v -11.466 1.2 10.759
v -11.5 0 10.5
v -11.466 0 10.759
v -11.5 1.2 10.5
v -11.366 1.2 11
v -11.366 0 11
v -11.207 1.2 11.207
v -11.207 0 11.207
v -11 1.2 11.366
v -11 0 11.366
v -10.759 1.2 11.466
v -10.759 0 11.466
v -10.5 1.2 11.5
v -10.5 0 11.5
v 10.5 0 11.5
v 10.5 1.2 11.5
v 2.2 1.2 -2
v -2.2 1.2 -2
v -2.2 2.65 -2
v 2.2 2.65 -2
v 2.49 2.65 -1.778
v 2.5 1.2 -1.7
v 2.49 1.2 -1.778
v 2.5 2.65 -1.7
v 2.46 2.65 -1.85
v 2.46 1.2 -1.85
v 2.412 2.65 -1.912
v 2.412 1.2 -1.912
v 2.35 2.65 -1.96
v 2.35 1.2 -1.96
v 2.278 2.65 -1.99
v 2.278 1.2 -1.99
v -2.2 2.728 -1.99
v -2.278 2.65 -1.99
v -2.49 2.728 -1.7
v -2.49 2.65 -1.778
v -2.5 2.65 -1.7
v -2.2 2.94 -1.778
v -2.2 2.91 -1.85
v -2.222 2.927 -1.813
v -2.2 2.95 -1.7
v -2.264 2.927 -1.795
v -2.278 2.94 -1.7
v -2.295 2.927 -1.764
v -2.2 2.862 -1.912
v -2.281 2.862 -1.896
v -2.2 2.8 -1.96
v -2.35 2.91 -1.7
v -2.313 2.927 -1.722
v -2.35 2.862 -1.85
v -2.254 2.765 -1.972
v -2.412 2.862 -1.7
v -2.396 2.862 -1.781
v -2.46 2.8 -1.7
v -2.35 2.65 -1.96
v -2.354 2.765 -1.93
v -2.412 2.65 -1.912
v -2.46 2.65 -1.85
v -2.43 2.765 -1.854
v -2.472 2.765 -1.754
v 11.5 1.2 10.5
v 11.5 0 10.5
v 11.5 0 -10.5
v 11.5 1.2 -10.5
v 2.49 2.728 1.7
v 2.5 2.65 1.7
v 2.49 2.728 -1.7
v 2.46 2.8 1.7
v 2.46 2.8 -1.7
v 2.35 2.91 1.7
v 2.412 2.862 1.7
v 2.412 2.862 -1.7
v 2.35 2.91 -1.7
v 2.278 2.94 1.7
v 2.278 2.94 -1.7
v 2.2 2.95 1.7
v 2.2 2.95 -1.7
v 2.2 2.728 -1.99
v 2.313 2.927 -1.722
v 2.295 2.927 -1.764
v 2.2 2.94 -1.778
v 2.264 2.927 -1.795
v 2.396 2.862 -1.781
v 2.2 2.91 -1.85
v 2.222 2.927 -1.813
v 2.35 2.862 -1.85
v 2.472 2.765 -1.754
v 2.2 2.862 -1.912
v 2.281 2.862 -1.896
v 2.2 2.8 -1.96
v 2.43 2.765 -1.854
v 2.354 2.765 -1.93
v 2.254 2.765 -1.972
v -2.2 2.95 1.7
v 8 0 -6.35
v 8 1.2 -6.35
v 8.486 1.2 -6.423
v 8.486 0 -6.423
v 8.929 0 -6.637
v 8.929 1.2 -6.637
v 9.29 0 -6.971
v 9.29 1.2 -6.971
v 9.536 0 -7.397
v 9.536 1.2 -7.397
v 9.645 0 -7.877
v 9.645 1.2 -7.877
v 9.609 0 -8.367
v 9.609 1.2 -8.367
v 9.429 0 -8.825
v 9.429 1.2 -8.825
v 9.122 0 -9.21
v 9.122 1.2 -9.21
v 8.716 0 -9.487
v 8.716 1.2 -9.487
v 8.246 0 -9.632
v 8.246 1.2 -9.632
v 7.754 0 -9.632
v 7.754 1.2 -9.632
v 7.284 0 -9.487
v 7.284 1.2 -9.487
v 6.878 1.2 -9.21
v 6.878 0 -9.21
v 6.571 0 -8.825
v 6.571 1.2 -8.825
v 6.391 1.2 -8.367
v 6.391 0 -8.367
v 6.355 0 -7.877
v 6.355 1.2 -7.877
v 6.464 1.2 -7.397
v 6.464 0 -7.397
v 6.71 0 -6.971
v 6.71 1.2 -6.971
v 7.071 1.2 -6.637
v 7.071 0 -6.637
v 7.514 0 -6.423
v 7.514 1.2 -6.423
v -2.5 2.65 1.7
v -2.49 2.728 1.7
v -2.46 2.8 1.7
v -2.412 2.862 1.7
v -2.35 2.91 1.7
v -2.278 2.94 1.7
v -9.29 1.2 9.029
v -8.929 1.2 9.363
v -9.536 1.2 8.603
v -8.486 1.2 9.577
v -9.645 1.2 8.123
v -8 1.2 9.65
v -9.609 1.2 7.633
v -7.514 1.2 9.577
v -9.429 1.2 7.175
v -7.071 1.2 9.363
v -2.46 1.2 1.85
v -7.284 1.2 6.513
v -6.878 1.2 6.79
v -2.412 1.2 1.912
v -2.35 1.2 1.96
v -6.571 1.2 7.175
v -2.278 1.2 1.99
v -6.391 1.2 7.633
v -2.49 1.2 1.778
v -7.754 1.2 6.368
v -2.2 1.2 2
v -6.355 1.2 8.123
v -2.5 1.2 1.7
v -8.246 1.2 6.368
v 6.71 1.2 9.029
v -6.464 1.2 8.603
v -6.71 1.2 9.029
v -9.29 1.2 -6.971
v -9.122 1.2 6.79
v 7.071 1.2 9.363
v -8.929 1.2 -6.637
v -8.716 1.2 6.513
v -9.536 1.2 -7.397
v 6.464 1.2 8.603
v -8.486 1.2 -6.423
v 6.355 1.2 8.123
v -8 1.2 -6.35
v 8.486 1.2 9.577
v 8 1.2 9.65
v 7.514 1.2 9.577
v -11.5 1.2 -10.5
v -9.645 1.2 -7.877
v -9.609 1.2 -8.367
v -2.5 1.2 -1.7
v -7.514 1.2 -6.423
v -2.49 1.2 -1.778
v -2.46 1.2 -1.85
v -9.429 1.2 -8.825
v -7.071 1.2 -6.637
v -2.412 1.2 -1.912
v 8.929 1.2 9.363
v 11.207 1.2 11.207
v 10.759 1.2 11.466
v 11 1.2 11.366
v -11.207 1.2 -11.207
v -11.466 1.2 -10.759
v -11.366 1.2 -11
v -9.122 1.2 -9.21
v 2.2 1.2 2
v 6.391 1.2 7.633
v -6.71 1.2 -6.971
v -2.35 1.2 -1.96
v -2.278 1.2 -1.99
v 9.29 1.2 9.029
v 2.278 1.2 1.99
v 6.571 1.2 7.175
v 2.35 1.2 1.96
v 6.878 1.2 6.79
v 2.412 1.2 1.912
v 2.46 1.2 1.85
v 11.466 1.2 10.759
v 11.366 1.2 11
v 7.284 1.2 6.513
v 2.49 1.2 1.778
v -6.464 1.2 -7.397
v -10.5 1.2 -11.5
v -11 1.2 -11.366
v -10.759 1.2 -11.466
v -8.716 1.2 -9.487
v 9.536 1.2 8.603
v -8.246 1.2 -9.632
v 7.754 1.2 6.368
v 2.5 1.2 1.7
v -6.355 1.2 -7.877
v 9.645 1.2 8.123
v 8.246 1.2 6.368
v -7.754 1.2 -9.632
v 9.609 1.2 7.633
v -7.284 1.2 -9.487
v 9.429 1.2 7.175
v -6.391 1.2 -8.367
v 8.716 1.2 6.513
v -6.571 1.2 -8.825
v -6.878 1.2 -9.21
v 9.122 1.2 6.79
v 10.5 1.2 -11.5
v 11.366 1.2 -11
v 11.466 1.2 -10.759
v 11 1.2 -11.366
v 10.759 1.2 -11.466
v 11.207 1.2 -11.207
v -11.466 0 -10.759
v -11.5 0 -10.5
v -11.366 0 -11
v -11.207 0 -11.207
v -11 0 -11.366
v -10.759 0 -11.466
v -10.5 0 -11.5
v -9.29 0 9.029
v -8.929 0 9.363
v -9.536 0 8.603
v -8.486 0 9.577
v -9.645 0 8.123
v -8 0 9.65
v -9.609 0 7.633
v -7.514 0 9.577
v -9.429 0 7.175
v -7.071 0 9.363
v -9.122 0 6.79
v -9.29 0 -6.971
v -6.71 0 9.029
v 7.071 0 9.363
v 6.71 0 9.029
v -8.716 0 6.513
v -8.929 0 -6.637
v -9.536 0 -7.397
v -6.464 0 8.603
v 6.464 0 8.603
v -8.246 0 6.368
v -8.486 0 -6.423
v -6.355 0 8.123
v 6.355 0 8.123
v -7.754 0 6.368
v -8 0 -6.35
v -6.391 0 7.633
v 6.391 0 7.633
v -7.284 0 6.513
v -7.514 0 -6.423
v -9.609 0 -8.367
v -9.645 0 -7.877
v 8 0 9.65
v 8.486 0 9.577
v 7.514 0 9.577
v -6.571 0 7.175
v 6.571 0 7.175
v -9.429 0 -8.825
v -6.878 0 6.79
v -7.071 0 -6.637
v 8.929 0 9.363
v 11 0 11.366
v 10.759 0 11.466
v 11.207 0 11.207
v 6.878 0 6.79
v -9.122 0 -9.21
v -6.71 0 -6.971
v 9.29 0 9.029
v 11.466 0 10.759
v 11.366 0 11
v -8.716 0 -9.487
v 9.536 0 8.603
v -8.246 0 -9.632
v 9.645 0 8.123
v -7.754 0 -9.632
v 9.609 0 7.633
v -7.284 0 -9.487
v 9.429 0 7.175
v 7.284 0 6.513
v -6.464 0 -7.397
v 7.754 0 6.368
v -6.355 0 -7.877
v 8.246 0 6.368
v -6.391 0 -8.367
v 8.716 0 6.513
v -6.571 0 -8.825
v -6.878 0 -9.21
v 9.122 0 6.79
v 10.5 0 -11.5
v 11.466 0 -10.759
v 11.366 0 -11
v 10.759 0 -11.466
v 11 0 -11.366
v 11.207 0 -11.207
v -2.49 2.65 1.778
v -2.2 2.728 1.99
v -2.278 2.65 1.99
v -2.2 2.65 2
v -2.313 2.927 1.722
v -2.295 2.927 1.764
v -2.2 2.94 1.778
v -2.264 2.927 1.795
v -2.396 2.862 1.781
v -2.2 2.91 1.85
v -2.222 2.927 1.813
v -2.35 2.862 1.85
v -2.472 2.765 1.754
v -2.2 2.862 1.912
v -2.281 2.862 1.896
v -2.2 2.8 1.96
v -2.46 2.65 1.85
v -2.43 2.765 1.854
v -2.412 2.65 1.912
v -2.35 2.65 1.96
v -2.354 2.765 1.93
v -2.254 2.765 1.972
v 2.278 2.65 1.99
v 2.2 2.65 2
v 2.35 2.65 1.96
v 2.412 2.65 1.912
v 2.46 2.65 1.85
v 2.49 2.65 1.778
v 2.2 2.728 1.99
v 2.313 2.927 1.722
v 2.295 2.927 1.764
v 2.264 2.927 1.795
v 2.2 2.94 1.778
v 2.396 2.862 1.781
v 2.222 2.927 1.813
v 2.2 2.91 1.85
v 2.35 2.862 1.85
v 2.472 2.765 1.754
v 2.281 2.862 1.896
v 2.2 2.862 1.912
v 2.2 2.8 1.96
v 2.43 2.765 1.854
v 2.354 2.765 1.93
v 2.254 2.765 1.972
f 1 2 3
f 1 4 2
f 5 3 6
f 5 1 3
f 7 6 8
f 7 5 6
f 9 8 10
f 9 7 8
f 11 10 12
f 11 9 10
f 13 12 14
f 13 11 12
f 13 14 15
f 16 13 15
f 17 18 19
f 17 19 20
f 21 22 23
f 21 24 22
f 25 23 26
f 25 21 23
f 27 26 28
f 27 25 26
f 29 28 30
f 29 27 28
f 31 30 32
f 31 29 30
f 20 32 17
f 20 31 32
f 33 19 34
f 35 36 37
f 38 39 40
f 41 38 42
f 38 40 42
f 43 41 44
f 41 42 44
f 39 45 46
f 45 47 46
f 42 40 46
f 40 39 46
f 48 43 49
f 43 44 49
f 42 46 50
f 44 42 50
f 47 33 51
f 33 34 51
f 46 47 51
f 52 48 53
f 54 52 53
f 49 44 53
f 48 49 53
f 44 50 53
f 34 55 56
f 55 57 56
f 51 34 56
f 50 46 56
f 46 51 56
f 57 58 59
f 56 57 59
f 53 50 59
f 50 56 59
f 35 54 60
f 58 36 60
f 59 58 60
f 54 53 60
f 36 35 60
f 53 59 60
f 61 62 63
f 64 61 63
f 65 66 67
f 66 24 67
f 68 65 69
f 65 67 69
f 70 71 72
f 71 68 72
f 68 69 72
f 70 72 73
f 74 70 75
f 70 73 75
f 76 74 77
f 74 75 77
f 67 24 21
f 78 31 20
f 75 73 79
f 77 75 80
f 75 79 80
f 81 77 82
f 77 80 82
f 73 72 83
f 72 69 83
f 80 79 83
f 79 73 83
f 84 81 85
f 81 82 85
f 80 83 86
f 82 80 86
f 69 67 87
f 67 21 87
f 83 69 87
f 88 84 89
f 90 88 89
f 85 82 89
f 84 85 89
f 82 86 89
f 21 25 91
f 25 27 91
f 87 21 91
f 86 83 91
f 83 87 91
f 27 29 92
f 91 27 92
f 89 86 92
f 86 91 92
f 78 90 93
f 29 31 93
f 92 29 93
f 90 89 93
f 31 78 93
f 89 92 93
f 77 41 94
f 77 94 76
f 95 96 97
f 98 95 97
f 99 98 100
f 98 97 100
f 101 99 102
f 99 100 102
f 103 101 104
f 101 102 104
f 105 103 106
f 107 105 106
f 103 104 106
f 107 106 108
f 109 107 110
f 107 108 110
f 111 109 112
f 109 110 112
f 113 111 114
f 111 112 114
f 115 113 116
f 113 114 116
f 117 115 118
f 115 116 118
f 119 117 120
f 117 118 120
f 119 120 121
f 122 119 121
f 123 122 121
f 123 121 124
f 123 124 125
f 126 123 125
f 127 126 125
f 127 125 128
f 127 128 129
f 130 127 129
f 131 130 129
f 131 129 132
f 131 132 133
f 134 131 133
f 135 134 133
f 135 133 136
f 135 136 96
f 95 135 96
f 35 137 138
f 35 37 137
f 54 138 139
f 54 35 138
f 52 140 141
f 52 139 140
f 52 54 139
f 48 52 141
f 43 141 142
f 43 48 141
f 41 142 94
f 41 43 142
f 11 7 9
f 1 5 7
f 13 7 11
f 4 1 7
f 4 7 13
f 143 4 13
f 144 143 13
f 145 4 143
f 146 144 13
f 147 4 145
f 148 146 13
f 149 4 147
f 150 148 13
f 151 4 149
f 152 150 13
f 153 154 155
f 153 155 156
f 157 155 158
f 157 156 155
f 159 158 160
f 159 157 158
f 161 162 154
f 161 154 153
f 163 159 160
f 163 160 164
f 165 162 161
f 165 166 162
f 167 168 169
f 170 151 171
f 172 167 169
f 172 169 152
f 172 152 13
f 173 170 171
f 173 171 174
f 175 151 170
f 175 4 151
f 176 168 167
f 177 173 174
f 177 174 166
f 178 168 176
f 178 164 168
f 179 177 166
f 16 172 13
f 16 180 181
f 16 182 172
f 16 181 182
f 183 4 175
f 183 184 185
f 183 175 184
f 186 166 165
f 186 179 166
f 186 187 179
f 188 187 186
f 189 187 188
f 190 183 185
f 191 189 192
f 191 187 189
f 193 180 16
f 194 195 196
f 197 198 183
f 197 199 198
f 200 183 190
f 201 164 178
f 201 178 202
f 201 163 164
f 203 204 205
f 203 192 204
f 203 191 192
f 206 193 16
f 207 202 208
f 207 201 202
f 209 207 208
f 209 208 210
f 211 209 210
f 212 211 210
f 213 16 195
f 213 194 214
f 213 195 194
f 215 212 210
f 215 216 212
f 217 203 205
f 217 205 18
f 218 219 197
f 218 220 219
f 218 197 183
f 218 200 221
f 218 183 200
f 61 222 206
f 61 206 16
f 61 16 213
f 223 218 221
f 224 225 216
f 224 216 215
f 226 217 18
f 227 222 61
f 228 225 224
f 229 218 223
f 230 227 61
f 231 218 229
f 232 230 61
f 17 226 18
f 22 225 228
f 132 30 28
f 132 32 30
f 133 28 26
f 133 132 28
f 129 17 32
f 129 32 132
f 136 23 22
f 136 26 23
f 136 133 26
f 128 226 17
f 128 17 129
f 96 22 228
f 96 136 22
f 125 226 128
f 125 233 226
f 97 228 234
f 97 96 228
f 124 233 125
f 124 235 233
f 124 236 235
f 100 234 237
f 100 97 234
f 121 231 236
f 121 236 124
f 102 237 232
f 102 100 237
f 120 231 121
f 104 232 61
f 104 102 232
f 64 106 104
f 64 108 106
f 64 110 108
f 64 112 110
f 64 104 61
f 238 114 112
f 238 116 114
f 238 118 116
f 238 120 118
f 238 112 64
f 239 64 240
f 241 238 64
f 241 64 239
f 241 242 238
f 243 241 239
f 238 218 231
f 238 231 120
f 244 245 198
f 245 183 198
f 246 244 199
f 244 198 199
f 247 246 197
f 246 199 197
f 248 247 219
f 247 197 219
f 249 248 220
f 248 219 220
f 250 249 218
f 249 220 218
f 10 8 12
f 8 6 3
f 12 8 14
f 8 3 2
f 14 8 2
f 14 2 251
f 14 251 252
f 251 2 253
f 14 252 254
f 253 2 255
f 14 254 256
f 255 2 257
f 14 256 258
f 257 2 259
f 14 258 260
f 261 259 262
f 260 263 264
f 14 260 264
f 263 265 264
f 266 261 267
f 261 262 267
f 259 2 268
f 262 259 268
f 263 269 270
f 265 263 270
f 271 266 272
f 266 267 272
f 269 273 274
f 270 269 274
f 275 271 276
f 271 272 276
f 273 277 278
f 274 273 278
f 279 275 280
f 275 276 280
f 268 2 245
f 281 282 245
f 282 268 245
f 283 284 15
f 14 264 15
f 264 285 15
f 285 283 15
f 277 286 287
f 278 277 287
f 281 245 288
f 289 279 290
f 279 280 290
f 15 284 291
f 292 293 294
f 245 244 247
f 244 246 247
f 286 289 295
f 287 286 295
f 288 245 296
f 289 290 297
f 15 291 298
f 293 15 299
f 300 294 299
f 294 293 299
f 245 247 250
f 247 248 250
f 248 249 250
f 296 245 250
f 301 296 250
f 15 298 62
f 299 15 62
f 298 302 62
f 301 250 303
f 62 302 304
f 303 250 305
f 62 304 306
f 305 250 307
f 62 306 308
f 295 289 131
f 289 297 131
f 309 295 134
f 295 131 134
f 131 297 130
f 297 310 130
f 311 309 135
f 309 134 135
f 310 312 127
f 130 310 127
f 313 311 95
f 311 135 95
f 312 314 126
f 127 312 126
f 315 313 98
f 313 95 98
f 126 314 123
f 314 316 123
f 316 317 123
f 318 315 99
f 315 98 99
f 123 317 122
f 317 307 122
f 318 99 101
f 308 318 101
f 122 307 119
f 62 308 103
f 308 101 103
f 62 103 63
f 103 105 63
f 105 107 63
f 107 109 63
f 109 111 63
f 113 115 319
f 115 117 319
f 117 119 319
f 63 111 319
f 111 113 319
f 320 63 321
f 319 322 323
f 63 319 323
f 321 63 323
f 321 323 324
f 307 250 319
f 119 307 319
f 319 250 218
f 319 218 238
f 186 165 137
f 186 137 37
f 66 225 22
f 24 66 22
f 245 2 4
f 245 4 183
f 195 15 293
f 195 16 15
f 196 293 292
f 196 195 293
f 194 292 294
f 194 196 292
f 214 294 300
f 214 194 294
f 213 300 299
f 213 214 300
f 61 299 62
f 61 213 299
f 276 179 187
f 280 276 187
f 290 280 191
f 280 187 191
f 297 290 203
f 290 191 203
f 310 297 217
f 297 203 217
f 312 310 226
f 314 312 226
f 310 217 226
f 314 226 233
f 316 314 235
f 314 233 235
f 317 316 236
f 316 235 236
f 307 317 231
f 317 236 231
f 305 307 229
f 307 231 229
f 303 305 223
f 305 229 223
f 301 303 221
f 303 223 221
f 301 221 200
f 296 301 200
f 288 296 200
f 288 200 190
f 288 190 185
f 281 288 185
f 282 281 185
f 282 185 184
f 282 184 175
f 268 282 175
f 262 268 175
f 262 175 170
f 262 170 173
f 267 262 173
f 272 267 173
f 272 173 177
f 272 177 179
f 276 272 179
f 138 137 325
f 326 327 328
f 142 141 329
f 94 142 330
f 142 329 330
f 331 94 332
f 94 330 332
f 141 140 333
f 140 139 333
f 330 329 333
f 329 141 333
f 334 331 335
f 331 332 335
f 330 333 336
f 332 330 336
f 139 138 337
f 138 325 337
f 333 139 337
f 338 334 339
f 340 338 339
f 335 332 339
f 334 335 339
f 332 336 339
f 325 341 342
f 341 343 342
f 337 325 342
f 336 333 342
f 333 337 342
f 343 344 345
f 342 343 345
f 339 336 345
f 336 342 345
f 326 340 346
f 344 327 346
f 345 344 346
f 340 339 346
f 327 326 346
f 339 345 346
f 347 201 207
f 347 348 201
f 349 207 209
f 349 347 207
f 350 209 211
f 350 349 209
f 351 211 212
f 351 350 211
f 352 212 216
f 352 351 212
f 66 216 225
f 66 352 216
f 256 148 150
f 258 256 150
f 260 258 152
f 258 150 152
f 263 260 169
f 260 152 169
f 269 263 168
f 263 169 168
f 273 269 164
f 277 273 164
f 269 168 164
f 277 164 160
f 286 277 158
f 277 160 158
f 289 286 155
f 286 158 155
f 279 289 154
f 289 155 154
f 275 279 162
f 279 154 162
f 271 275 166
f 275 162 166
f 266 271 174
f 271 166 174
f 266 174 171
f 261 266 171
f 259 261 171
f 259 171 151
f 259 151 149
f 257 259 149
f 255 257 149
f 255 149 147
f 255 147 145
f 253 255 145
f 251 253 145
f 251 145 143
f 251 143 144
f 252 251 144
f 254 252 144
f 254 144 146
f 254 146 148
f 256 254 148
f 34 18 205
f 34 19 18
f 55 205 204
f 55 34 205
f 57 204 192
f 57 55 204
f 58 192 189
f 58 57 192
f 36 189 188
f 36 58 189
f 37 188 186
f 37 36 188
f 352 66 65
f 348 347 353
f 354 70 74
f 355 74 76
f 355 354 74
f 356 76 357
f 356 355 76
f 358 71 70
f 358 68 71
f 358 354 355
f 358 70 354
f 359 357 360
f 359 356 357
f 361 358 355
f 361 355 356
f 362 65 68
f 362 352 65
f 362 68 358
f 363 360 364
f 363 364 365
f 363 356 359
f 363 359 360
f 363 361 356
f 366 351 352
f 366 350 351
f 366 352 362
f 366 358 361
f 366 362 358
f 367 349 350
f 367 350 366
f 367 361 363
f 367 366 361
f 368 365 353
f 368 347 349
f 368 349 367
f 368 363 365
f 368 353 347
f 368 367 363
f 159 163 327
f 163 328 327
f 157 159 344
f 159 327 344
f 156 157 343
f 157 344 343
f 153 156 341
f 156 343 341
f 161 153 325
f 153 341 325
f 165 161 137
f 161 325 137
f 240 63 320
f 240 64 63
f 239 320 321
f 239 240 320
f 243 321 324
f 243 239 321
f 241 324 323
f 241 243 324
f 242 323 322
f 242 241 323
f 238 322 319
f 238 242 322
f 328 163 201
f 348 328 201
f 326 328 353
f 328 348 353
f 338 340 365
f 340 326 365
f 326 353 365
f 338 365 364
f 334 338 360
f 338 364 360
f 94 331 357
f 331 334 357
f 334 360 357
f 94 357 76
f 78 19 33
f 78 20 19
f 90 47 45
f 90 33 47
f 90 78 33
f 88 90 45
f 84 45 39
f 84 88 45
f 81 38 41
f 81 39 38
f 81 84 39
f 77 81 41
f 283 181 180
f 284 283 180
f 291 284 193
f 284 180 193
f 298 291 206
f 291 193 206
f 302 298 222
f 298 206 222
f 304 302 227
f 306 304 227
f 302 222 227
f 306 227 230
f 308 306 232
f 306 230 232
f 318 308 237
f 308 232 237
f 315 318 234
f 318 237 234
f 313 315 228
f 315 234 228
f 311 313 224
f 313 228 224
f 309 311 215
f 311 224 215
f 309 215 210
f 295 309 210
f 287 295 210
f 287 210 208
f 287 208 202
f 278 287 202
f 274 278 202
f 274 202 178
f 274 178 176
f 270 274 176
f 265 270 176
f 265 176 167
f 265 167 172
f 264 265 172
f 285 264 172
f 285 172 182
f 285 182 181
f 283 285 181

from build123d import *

# Parameters (mm, degrees)
SKETCH1_W           = 23
SKETCH1_H           = 23
BOSS_EXTRUDE1_DEPTH = 1.2
FILLET1_R           = 1
SKETCH2_W           = 5
SKETCH2_H           = 4
BOSS_EXTRUDE2_DEPTH = 1.75
FILLET2_R           = 0.3
SKETCH4_R           = 1.65
CUT_EXTRUDE1_DEPTH  = 1.75


with BuildPart() as part:
    # Sketch1 → Boss-Extrude1 (new body)
    with BuildSketch(Plane(origin=(0, 0, 0), x_dir=(1, 0, 0), z_dir=(0, 1, 0))):
        Rectangle(SKETCH1_W, SKETCH1_H)
    extrude(amount=BOSS_EXTRUDE1_DEPTH)

    # Fillet1
    fillet1_edges = [part.edges().sort_by_distance(p)[0] for p in [
        (11.5, 0.6, 11.5),
        (-11.5, 0.6, 11.5),
        (-11.5, 0.6, -11.5),
        (11.5, 0.6, -11.5),
    ]]
    fillet(fillet1_edges, radius=FILLET1_R)

    # Sketch2 → Boss-Extrude2 (add)
    with BuildSketch(Plane(origin=(0, 1.2, 0), x_dir=(1, 0, 0), z_dir=(0, 1, 0))):
        Rectangle(SKETCH2_W, SKETCH2_H)
    extrude(amount=BOSS_EXTRUDE2_DEPTH)

    # Fillet2
    fillet2_edges = [part.edges().sort_by_distance(p)[0] for p in [
        (2.5, 2.075, 2),
        (2.5, 2.075, -2),
        (-2.5, 2.075, -2),
        (-2.5, 2.075, 2),
        (2.5, 2.95, 0),
        (0, 2.95, -2),
        (-2.5, 2.95, 0),
        (0, 2.95, 2),
    ]]
    fillet(fillet2_edges, radius=FILLET2_R)

    # Sketch4 → Cut-Extrude1 (cut)
    with BuildSketch(Plane(origin=(0, 1.2, 0), x_dir=(1, 0, 0), z_dir=(0, 1, 0))):
        with Locations(Location((-8, 8, 0), (0, 0, 270))):
            Circle(SKETCH4_R)
        with Locations(Location((8, 8, 0), (0, 0, 270))):
            Circle(SKETCH4_R)
        with Locations(Location((8, -8, 0), (0, 0, 270))):
            Circle(SKETCH4_R)
        with Locations(Location((-8, -8, 0), (0, 0, 270))):
            Circle(SKETCH4_R)
    extrude(amount=-CUT_EXTRUDE1_DEPTH, mode=Mode.SUBTRACT)


solid = part.part
